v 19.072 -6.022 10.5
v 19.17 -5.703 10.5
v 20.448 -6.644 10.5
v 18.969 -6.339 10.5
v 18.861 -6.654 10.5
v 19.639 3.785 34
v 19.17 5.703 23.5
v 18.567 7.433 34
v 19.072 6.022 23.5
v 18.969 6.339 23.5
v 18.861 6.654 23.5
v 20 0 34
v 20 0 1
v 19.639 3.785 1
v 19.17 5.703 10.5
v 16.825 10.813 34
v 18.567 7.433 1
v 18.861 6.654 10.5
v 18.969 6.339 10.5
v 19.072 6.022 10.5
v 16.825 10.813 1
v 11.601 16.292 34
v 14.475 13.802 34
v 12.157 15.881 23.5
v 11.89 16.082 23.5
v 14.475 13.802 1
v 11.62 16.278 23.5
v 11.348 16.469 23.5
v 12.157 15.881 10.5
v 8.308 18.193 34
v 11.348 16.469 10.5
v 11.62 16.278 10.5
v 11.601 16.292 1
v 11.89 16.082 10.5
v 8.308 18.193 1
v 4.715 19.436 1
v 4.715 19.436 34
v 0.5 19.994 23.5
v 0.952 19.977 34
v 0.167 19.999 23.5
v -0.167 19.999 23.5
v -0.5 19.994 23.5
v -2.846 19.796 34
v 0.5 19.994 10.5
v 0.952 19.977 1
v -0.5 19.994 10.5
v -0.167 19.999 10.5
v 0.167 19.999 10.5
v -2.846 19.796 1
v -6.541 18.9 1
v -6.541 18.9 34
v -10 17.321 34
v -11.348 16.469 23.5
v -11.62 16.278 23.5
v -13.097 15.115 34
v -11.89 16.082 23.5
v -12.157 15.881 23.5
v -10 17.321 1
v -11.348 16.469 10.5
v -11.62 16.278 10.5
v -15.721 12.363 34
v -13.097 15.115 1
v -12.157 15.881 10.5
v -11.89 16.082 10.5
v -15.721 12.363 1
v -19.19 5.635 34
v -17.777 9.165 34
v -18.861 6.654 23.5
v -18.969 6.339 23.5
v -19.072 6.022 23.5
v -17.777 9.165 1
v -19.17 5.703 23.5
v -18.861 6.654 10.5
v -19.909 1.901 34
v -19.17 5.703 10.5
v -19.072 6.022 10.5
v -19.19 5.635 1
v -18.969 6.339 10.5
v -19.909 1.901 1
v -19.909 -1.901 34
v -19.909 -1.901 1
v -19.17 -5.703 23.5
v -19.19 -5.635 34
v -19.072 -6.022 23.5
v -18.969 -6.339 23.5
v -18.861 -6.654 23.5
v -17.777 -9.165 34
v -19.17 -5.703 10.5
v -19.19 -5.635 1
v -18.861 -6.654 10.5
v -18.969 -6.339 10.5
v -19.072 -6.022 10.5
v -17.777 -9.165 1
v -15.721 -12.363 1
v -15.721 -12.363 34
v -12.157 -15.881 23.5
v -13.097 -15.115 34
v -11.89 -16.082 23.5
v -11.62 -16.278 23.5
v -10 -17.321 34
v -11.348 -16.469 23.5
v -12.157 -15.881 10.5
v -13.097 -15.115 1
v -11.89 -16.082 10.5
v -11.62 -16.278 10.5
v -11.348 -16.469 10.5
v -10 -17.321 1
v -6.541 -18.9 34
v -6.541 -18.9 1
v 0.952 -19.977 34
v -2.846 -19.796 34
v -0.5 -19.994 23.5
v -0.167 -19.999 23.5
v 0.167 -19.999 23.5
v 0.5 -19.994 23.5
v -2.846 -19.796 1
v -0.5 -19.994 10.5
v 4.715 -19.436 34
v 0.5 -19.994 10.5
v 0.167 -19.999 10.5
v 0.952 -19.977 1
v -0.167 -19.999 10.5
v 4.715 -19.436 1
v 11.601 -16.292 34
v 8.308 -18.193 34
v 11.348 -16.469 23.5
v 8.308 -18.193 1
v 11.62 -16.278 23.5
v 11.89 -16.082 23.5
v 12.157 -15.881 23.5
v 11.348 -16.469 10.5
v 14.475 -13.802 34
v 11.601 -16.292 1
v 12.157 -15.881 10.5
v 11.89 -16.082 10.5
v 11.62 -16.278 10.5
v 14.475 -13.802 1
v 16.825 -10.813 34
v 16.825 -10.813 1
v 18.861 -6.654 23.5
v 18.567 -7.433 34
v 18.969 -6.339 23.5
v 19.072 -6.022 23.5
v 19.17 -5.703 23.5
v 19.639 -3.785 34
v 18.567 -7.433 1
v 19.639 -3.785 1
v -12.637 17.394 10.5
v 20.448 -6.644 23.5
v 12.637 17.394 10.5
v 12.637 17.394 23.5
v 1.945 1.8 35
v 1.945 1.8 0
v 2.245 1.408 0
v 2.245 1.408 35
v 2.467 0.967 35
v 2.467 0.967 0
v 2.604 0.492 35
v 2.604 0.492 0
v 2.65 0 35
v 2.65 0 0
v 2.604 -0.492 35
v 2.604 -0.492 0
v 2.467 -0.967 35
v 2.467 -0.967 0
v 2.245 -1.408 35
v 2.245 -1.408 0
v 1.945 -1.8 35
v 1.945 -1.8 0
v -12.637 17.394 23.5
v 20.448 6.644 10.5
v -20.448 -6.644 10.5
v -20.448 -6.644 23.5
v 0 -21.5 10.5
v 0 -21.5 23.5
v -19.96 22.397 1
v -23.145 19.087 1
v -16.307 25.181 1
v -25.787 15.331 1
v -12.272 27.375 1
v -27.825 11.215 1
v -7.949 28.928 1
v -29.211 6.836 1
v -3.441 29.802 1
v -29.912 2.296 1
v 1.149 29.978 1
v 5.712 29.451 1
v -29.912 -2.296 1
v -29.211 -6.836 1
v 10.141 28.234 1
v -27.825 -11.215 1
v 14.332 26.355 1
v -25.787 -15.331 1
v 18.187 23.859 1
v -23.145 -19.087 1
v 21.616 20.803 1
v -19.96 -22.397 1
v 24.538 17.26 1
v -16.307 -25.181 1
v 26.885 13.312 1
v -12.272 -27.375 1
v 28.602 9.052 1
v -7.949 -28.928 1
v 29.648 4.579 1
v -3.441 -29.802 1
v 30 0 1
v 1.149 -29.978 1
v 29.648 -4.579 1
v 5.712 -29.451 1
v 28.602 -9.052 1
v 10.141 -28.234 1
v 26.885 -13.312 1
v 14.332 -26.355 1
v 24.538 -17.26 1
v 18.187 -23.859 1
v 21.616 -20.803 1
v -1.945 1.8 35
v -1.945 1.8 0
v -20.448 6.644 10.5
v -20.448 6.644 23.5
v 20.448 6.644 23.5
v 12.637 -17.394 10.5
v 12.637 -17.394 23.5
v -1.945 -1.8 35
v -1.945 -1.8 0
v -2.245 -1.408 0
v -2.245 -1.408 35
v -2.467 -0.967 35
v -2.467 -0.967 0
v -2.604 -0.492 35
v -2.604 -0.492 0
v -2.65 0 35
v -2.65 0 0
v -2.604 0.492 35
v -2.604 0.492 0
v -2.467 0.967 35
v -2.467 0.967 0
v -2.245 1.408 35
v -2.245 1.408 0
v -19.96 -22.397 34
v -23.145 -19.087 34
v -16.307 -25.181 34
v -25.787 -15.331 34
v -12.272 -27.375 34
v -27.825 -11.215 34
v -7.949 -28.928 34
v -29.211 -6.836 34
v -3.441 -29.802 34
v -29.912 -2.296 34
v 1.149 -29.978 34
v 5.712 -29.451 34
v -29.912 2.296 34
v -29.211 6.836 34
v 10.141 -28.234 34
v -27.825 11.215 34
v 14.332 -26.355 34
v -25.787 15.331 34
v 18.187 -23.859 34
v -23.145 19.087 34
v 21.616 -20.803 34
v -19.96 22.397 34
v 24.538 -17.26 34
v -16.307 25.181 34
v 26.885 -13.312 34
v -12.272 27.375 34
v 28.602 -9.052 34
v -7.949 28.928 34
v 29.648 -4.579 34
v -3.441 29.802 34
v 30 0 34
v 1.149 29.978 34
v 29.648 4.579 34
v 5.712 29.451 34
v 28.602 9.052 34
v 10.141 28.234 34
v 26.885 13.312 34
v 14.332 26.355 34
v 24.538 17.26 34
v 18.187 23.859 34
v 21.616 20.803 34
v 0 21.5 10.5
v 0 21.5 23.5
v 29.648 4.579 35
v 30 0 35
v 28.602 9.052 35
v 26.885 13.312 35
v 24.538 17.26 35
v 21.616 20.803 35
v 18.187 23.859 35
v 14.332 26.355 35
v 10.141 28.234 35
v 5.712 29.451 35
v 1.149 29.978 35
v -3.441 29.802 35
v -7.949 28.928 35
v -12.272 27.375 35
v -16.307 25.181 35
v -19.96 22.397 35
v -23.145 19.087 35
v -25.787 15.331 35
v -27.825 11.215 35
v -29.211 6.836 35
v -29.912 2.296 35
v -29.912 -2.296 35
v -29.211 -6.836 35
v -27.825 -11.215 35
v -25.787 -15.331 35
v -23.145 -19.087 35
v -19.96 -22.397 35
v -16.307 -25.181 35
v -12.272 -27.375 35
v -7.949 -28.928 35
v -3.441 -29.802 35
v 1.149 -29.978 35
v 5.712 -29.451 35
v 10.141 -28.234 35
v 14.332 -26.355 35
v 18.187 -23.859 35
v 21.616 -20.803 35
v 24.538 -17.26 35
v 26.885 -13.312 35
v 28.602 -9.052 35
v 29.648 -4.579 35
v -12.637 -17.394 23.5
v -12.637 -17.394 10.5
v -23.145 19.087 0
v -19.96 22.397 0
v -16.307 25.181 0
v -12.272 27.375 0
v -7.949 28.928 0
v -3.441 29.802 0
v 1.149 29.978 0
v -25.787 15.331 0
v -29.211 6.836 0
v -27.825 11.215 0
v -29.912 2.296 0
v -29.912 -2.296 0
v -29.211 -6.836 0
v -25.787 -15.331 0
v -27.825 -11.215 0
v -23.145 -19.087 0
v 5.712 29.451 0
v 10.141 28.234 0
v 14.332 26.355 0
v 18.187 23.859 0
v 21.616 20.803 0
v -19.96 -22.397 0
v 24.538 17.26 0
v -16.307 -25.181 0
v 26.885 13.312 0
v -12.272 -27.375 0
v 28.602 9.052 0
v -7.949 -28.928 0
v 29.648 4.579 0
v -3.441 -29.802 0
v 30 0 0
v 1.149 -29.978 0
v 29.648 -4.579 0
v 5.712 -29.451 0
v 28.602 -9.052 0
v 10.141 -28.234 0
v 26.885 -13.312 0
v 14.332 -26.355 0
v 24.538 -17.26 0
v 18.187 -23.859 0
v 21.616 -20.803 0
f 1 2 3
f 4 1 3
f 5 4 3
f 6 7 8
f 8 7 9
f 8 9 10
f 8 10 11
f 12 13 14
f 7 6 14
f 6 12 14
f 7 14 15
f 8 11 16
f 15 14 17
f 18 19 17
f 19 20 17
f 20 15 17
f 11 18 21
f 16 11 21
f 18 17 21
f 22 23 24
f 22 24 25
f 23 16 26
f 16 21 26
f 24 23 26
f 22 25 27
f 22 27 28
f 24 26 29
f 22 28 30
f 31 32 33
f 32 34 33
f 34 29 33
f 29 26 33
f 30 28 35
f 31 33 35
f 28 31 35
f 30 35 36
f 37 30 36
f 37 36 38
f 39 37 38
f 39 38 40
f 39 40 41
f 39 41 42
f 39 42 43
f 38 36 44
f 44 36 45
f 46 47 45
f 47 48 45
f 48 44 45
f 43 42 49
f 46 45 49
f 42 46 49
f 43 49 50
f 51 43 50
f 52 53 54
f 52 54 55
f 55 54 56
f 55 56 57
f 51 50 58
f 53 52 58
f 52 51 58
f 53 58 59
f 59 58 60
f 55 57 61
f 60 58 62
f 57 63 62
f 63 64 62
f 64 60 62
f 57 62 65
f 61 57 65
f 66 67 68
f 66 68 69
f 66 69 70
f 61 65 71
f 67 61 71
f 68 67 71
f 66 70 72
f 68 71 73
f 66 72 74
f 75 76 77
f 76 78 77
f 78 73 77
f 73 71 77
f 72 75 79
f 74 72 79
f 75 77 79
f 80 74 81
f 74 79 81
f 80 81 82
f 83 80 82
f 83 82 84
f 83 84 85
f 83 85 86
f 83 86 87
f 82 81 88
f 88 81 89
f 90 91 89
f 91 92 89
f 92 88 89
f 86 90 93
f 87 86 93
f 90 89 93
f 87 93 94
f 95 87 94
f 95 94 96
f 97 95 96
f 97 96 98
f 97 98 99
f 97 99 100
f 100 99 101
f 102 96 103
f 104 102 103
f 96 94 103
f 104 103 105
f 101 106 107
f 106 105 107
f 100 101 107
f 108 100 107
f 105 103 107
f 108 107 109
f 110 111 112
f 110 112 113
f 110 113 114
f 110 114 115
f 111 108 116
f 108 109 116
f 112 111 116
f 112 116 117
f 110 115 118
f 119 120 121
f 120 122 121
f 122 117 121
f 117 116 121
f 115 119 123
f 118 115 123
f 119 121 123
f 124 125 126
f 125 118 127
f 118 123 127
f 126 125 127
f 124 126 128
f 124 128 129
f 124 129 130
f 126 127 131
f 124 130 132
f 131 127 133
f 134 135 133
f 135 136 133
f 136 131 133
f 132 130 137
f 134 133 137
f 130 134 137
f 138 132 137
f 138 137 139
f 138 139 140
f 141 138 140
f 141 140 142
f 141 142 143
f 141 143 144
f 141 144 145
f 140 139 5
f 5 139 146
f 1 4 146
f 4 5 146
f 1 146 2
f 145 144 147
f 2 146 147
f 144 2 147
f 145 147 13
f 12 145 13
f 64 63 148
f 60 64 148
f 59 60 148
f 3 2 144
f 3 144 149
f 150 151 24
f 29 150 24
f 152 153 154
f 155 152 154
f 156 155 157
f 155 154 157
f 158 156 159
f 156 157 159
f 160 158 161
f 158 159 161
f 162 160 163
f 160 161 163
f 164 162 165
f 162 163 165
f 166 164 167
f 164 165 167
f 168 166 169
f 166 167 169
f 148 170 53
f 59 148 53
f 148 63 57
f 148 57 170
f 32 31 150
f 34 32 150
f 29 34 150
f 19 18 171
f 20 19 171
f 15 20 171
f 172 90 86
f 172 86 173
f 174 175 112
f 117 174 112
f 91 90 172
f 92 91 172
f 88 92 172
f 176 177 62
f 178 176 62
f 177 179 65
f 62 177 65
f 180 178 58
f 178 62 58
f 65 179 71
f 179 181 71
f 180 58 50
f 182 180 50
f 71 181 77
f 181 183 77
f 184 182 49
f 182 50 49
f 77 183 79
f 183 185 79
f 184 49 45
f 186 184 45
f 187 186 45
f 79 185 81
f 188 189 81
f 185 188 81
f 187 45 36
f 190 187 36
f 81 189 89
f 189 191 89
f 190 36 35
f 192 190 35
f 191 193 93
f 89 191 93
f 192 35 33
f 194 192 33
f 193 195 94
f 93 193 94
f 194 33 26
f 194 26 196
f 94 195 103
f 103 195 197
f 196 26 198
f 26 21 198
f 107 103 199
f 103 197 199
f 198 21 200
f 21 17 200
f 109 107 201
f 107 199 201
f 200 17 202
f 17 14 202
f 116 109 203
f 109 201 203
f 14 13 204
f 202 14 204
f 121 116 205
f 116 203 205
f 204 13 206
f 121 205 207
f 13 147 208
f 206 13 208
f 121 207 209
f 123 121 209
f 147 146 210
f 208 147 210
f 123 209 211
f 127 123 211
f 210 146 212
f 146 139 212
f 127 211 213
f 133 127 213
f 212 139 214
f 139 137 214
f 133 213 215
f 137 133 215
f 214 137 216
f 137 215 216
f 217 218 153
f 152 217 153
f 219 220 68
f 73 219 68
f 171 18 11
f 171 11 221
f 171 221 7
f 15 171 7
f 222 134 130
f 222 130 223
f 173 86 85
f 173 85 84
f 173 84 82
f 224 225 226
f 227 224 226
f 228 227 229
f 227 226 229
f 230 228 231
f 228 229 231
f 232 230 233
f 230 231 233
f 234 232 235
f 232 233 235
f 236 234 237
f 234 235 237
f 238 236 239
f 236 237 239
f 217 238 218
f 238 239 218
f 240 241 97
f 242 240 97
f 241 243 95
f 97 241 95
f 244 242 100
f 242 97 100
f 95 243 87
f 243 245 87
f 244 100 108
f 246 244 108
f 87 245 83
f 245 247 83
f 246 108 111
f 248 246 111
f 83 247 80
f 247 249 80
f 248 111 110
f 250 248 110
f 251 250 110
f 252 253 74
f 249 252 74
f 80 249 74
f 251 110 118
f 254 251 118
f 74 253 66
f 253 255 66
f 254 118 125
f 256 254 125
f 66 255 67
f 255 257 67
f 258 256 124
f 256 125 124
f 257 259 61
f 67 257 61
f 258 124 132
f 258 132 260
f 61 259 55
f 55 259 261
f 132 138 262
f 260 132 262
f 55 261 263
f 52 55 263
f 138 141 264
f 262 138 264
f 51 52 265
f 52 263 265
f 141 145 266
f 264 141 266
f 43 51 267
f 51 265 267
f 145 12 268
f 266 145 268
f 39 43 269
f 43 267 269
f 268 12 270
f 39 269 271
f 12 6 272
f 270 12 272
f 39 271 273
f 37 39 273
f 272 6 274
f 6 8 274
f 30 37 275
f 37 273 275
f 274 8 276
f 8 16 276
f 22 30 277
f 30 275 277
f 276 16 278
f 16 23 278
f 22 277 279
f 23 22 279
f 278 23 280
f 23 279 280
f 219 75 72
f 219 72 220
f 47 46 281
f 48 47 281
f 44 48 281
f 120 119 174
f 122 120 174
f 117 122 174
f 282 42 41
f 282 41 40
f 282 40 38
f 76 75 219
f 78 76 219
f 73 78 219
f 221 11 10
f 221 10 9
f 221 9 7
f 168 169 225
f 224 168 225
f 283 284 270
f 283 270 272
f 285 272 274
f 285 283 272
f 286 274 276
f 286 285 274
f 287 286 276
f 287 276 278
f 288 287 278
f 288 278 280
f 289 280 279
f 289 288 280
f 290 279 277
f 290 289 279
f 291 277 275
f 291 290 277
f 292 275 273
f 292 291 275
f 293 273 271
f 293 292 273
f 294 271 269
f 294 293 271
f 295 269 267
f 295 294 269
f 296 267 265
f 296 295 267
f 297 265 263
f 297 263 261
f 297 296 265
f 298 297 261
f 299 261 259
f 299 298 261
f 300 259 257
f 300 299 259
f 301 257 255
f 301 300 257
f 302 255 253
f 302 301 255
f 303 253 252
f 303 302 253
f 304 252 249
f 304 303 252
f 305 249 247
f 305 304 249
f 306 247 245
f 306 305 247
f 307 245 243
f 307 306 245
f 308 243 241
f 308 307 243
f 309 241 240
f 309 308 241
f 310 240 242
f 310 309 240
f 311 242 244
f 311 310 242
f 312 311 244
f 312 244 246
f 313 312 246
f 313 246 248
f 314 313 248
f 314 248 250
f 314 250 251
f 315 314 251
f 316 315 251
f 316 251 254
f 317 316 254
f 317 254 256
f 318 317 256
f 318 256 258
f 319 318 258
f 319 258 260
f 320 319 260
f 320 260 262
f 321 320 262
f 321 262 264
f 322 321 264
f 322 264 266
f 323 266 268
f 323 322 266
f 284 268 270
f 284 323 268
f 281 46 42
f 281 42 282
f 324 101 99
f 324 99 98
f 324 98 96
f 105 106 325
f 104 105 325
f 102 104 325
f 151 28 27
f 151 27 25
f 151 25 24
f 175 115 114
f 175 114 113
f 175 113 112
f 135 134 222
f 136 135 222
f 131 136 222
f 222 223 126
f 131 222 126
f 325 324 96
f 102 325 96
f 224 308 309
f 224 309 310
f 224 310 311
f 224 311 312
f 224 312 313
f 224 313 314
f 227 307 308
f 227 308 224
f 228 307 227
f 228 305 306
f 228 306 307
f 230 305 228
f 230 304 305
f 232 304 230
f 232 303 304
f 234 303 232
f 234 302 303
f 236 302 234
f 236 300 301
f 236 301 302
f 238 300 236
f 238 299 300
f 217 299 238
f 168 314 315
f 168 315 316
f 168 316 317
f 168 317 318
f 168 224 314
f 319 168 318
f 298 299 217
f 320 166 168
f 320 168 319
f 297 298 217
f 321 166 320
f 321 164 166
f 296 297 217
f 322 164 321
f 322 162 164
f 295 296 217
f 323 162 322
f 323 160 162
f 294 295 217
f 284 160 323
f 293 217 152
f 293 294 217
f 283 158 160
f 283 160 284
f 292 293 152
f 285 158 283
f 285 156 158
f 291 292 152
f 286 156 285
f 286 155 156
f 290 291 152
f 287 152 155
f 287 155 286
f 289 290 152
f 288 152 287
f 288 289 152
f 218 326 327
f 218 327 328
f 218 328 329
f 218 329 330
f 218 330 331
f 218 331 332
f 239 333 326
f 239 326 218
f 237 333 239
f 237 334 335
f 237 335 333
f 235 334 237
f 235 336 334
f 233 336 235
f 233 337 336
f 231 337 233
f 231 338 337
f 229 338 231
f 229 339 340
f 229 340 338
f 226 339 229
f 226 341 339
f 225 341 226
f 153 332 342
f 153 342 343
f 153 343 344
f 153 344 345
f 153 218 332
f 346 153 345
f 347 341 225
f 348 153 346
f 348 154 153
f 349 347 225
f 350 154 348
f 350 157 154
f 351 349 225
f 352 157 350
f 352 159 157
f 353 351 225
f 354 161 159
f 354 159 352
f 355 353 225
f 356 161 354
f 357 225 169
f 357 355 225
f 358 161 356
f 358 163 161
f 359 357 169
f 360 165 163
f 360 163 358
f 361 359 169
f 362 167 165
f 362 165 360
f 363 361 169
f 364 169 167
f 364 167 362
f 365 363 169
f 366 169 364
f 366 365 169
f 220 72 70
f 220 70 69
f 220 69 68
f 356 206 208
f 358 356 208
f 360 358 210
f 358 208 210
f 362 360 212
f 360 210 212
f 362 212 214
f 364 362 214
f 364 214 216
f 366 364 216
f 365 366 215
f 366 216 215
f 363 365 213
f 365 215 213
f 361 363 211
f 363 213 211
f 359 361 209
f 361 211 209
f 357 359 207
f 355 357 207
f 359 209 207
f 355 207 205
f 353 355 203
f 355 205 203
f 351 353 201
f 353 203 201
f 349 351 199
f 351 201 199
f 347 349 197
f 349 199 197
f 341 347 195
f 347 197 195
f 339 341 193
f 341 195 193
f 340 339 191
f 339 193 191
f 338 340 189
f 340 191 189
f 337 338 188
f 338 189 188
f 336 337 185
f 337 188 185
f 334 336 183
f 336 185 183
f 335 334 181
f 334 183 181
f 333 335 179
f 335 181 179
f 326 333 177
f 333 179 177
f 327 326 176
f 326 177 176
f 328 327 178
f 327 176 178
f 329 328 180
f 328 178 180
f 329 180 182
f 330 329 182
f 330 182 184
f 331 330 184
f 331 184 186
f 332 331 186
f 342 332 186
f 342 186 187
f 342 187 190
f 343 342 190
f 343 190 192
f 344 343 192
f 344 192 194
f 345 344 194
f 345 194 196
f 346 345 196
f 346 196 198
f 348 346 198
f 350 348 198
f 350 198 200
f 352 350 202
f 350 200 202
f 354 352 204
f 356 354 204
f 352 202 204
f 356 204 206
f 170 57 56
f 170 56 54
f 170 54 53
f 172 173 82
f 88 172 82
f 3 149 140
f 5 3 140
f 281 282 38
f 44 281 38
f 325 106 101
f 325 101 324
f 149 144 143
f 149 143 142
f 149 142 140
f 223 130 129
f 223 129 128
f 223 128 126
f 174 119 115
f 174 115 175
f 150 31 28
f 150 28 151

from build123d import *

# Parameters (mm, degrees)
SKETCH_1_R               = 20
EXTRUDE_1_DEPTH          = 35
SKETCH_3_R               = 30
EXTRUDE_2_DEPTH          = 1
EXTRUDE_START            = -1
SKETCH_4_R               = 30
EXTRUDE_3_DEPTH          = 1
CUT_EXTRUDE_2_DEPTH      = 56
CUT_EXTRUDE_2_DEPTH_BACK = 56
SKETCH_5_W               = 1
SKETCH_5_H               = 13
EXTRUDE_4_DEPTH          = 21.5
CUT_EXTRUDE_3_REACH      = 50.5
PATTERN_CIRCULAR_2_COUNT = 10
CUT_EXTRUDE_5_DEPTH      = 56
CUT_EXTRUDE_5_DEPTH_BACK = 56


with BuildPart() as part:
    # Эскиз1 → Бобышка-Вытянуть1 (new body)
    with BuildSketch(Plane.XY):
        Circle(SKETCH_1_R)
    extrude(amount=EXTRUDE_1_DEPTH)

    # Эскиз3 → Бобышка-Вытянуть2 (add)
    with BuildSketch(Plane.XY.offset(35)):
        Circle(SKETCH_3_R)
    extrude(amount=-EXTRUDE_2_DEPTH)

    # Эскиз4 → Бобышка-Вытянуть3 (add)
    with BuildSketch(Plane(origin=(0, 0, 0), x_dir=(-1, 0, 0), z_dir=(0, 0, -1)).offset(EXTRUDE_START)):
        with Locations(Location((0, 0, 0), (0, 0, 180))):
            Circle(SKETCH_4_R)
    extrude(amount=EXTRUDE_3_DEPTH)

    # Эскиз2 → Вырез-Вытянуть2 (cut, two sides: drawn at the far end of the back side and taken through both)
    with BuildSketch(Plane.XY.offset(35).offset(-CUT_EXTRUDE_2_DEPTH_BACK)):
        with BuildLine():
            Line((-1.944865034, 1.8), (1.944865034, 1.8))
            ThreePointArc((1.944865034, 1.8), (2.65, 0), (1.944865034, -1.8))
            Line((1.944865034, -1.8), (-1.944865034, -1.8))
            ThreePointArc((-1.944865034, -1.8), (-2.65, 0), (-1.944865034, 1.8))
        make_face()
    extrude(amount=CUT_EXTRUDE_2_DEPTH + CUT_EXTRUDE_2_DEPTH_BACK, mode=Mode.SUBTRACT)

    # Эскиз5 → Бобышка-Вытянуть4 (add)
    with BuildSketch(Plane(origin=(0, 0, 0), x_dir=(1, 0, 0), z_dir=(0, 1, 0))):
        with Locations((0, -17)):
            Rectangle(SKETCH_5_W, SKETCH_5_H)
    extrude_4 = extrude(amount=EXTRUDE_4_DEPTH)

    # Эскиз6 → Вырез-Вытянуть3 (cut, up to next)
    with BuildSketch(Plane.XY.offset(23.5), mode=Mode.PRIVATE) as cut_extrude_3_sk1:
        Polygon((-0.5, 19.993749023), (0, 21.5), (-0.5, 21.5), align=None)
    cut_extrude_3_tool1 = extrude(cut_extrude_3_sk1.sketch, amount=-CUT_EXTRUDE_3_REACH, mode=Mode.PRIVATE) & part.part
    # Эскиз6 → Вырез-Вытянуть3 (cut, up to next)
    with BuildSketch(Plane.XY.offset(23.5), mode=Mode.PRIVATE) as cut_extrude_3_sk2:
        Polygon((0.5, 21.5), (0, 21.5), (0.5, 19.993749023), align=None)
    cut_extrude_3_tool2 = extrude(cut_extrude_3_sk2.sketch, amount=-CUT_EXTRUDE_3_REACH, mode=Mode.PRIVATE) & part.part
    cut_extrude_3_1 = cut_extrude_3_tool1.solids().sort_by_distance((-0.333333, 20.997916, 23.5))[0]
    add(cut_extrude_3_1, mode=Mode.SUBTRACT)
    cut_extrude_3_2 = cut_extrude_3_tool2.solids().sort_by_distance((0.333333, 20.997916, 23.5))[0]
    add(cut_extrude_3_2, mode=Mode.SUBTRACT)
    cut_extrude_3 = cut_extrude_3_1 + cut_extrude_3_2  # Вырез-Вытянуть3 as one shape, for the pattern or mirror that repeats it

    # Круговой массив2: Бобышка-Вытянуть4, Вырез-Вытянуть3 ×10 about axis
    pattern_circular_2_axis = Axis((0, 0, 0), (0, 0, 1))
    add([extrude_4.rotate(pattern_circular_2_axis, i * 360 / PATTERN_CIRCULAR_2_COUNT) for i in range(1, PATTERN_CIRCULAR_2_COUNT)])
    add([cut_extrude_3.rotate(pattern_circular_2_axis, i * 360 / PATTERN_CIRCULAR_2_COUNT) for i in range(1, PATTERN_CIRCULAR_2_COUNT)], mode=Mode.SUBTRACT)

    # Эскиз8 → Вырез-Вытянуть5 (cut, two sides: drawn at the far end of the back side and taken through both)
    with BuildSketch(Plane.XY.offset(35).offset(-CUT_EXTRUDE_5_DEPTH_BACK)):
        with BuildLine():
            ThreePointArc((-1.944865034, -1.8), (-2.65, 0), (-1.944865034, 1.8))
            Line((-1.944865034, 1.8), (1.944865034, 1.8))
            ThreePointArc((1.944865034, 1.8), (2.65, 0), (1.944865034, -1.8))
            Line((1.944865034, -1.8), (-1.944865034, -1.8))
        make_face()
    extrude(amount=CUT_EXTRUDE_5_DEPTH + CUT_EXTRUDE_5_DEPTH_BACK, mode=Mode.SUBTRACT)


solid = part.part
